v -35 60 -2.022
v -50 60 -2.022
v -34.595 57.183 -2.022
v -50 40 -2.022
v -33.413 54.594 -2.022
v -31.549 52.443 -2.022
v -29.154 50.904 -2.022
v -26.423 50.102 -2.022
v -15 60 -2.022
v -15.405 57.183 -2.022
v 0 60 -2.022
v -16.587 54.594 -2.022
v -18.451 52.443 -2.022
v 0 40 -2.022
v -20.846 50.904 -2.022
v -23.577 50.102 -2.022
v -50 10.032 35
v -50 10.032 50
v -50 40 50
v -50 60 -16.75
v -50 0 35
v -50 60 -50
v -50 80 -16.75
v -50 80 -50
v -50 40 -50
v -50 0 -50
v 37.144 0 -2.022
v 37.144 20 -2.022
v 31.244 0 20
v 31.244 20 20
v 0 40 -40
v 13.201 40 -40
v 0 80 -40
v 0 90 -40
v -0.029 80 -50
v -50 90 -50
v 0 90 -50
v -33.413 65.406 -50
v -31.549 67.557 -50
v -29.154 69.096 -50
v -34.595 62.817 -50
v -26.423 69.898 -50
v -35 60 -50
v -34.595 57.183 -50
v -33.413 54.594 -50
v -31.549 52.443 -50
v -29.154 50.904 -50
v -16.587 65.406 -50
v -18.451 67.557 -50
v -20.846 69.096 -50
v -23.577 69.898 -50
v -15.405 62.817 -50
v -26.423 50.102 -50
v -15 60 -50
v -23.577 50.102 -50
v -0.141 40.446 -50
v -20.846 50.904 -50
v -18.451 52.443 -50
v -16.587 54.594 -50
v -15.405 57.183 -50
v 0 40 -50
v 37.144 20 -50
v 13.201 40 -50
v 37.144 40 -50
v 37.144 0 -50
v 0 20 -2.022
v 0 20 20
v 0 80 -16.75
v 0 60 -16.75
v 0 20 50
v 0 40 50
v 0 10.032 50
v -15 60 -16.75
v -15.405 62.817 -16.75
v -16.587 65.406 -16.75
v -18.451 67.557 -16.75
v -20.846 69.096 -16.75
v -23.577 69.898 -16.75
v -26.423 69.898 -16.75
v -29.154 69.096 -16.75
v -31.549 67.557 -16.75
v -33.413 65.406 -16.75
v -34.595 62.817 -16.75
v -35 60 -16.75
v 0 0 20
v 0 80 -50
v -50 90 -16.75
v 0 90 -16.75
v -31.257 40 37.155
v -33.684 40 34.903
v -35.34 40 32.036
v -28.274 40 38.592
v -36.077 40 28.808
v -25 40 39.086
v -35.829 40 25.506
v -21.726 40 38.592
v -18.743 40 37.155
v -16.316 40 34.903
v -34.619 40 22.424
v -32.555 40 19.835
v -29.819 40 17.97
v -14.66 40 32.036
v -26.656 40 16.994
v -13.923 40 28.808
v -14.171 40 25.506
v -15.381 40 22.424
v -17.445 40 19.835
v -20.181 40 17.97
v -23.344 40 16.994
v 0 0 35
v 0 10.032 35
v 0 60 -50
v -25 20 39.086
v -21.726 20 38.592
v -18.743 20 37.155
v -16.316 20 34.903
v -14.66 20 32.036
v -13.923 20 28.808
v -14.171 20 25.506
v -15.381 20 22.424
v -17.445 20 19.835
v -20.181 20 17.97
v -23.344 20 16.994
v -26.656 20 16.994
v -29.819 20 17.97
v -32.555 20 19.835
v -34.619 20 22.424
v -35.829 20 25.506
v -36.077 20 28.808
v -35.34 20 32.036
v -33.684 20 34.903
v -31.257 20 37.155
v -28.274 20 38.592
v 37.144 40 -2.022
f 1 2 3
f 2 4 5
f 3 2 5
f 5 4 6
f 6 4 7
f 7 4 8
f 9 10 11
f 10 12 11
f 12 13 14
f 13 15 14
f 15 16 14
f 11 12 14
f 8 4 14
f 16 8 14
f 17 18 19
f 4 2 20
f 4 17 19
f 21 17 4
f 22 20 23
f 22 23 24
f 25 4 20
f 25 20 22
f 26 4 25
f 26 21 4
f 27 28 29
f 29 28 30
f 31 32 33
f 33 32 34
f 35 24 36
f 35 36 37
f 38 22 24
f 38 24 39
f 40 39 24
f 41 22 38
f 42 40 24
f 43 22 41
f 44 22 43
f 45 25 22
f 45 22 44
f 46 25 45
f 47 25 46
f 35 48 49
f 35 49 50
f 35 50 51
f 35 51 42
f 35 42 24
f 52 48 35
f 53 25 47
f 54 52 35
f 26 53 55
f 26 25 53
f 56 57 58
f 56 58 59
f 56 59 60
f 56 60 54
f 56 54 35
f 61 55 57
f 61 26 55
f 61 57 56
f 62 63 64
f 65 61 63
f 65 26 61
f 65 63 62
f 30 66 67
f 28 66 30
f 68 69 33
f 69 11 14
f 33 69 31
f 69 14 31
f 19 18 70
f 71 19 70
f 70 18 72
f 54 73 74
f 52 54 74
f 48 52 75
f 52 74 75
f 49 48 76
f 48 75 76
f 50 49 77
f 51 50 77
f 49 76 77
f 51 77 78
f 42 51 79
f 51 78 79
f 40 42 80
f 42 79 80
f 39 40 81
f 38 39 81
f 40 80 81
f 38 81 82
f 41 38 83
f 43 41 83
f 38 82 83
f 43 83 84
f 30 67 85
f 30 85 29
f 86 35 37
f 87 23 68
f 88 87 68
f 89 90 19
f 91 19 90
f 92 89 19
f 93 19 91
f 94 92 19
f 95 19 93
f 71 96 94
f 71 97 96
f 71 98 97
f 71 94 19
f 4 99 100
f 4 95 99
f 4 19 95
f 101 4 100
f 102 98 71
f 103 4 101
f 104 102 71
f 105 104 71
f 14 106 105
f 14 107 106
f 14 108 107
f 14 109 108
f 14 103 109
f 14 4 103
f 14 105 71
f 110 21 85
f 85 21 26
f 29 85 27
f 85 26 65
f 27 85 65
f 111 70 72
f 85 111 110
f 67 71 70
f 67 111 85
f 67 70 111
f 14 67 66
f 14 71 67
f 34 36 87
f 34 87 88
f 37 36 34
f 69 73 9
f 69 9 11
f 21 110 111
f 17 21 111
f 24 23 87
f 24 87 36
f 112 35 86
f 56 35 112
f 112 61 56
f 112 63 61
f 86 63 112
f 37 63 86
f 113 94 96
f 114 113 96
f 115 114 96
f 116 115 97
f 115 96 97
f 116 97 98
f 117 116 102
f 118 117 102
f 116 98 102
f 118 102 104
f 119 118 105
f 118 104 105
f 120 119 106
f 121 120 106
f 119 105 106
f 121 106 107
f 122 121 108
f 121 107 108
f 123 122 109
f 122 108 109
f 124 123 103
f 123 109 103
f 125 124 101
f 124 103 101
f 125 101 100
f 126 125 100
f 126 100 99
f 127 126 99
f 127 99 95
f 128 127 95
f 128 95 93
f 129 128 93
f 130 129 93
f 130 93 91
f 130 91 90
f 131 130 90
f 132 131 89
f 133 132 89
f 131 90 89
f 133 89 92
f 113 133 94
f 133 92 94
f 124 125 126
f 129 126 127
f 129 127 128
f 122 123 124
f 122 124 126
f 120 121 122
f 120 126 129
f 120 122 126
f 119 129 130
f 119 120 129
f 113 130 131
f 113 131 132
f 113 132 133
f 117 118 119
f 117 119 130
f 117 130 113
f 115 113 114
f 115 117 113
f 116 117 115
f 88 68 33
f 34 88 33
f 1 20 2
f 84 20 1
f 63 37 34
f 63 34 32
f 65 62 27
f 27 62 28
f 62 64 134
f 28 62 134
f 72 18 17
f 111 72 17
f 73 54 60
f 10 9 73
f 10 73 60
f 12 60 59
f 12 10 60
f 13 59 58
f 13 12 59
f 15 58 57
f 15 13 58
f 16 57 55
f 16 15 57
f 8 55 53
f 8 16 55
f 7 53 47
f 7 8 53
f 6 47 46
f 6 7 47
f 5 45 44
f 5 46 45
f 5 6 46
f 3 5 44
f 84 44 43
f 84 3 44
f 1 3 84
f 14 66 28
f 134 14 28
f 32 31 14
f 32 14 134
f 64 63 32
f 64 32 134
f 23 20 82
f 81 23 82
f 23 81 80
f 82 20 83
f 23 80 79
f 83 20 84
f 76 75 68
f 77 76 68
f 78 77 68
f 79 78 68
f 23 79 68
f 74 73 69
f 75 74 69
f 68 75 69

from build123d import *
from build123d.topology import SkipClean

# Parameters (mm, degrees)
CROQUIS1_W               = 100
CROQUIS1_H               = 100
SALIENTE_EXTRUIR1_DEPTH  = 20
CROQUIS2_W               = 50
CROQUIS2_H               = 52.022123513
SALIENTE_EXTRUIR2_DEPTH  = 20
CROQUIS6_W               = 50
CROQUIS6_H               = 30
CORTAR_EXTRUIR1_DEPTH    = 20
CROQUIS9_W               = 15
CROQUIS9_H               = 10.032008702
CORTAR_EXTRUIR8_DEPTH    = 50
CROQUIS10_R              = 11.107626401
CORTAR_EXTRUIR9_DEPTH    = 20
CORTAR_EXTRUIR11_DEPTH   = 20
CROQUIS14_W              = 87.144366741
CROQUIS14_H              = 47.977876487
SALIENTE_EXTRUIR4_DEPTH  = 20
CORTAR_EXTRUIR12_DEPTH   = 20
CROQUIS16_W              = 50
CROQUIS16_H              = 47.977876487
SALIENTE_EXTRUIR5_DEPTH  = 20
CORTAR_EXTRUIR13_DEPTH   = 94.841895413
CROQUIS22_W              = 50
CROQUIS22_H              = 33.250287406
SALIENTE_EXTRUIR6_DEPTH  = 20
CORTAR_EXTRUIR14_DEPTH   = 116.566102865
CROQUIS25_W              = 50
CROQUIS25_H              = 33.250287406
SALIENTE_EXTRUIR7_DEPTH  = 10
SALIENTE_EXTRUIR10_DEPTH = 10


with BuildPart() as part:
    # Croquis1 → Saliente-Extruir1 (new body)
    with BuildSketch(Plane(origin=(0, 0, 0), x_dir=(1, 0, 0), z_dir=(0, 1, 0))):
        Rectangle(CROQUIS1_W, CROQUIS1_H)
    extrude(amount=SALIENTE_EXTRUIR1_DEPTH)

    # Croquis2 → Saliente-Extruir2 (add)
    with BuildSketch(Plane(origin=(0, 20, 0), x_dir=(1, 0, 0), z_dir=(0, 1, 0))):
        with Locations((-25, -23.988938244)):
            Rectangle(CROQUIS2_W, CROQUIS2_H)
    extrude(amount=SALIENTE_EXTRUIR2_DEPTH)

    # Croquis6 → Cortar-Extruir1 (cut)
    with BuildSketch(Plane(origin=(0, 20, 0), x_dir=(1, 0, 0), z_dir=(0, 1, 0))):
        with Locations((25, -35)):
            Rectangle(CROQUIS6_W, CROQUIS6_H)
    extrude(amount=-CORTAR_EXTRUIR1_DEPTH, mode=Mode.SUBTRACT)

    # Croquis9 → Cortar-Extruir8 (cut)
    with BuildSketch(Plane(origin=(0, 0, 0), x_dir=(0, 0, -1), z_dir=(1, 0, 0))):
        with Locations((-42.5, 5.016004351)):
            Rectangle(CROQUIS9_W, CROQUIS9_H)
    extrude(amount=-CORTAR_EXTRUIR8_DEPTH, mode=Mode.SUBTRACT)

    # Croquis10 → Cortar-Extruir9 (cut)
    with BuildSketch(Plane(origin=(0, 40, 0), x_dir=(1, 0, 0), z_dir=(0, 1, 0))):
        with Locations(Location((-25, -27.977876487, 0), (0, 0, 270))):
            Circle(CROQUIS10_R)
    extrude(amount=-CORTAR_EXTRUIR9_DEPTH, mode=Mode.SUBTRACT)

    # Croquis12 → Cortar-Extruir11 (cut)
    with BuildSketch(Plane(origin=(0, 20, 0), x_dir=(1, 0, 0), z_dir=(0, 1, 0))):
        Polygon((50, 50), (31.24355653, -20), (50, -20), align=None)
    extrude(amount=-CORTAR_EXTRUIR11_DEPTH, mode=Mode.SUBTRACT)

    # Croquis14 → Saliente-Extruir4 (add)
    with BuildSketch(Plane(origin=(0, 20, 0), x_dir=(1, 0, 0), z_dir=(0, 1, 0))):
        with Locations((-6.42781663, 26.011061756)):
            Rectangle(CROQUIS14_W, CROQUIS14_H)
    extrude(amount=SALIENTE_EXTRUIR4_DEPTH)

    # Croquis15 → Cortar-Extruir12 (cut)
    with BuildSketch(Plane(origin=(0, 20, 0), x_dir=(1, 0, 0), z_dir=(0, 1, 0))):
        Polygon((37.144366741, 50), (37.144366741, 2.022123513), (50, 50), align=None)
    extrude(amount=-CORTAR_EXTRUIR12_DEPTH, mode=Mode.SUBTRACT)

    # Croquis16 → Saliente-Extruir5 (add)
    with BuildSketch(Plane(origin=(0, 40, 0), x_dir=(1, 0, 0), z_dir=(0, 1, 0))):
        with Locations((-25, 26.011061756)):
            Rectangle(CROQUIS16_W, CROQUIS16_H)
    extrude(amount=SALIENTE_EXTRUIR5_DEPTH)

    # Croquis19 → Cortar-Extruir13 (cut, through all)
    with BuildSketch(Plane.XY.offset(-2.022123513)):
        with BuildLine():
            Line((-35, 60), (-15, 60))
            ThreePointArc((-15, 60), (-25, 50), (-35, 60))
        make_face()
    extrude(amount=-CORTAR_EXTRUIR13_DEPTH, mode=Mode.SUBTRACT)

    # Croquis22 → Saliente-Extruir6 (add)
    with BuildSketch(Plane(origin=(0, 60, 0), x_dir=(1, 0, 0), z_dir=(0, 1, 0))):
        with Locations((-25, 33.374856297)):
            Rectangle(CROQUIS22_W, CROQUIS22_H)
    extrude(amount=SALIENTE_EXTRUIR6_DEPTH)

    # Croquis23 → Cortar-Extruir14 (cut, through all)
    with SkipClean():  # the faces are left unmerged after this step: merging them gives an invalid solid
        with BuildSketch(Plane.XY.offset(-16.749712594)):
            with BuildLine():
                Line((-35, 60), (-15, 60))
                ThreePointArc((-15, 60), (-25, 70), (-35, 60))
            make_face()
        extrude(amount=-CORTAR_EXTRUIR14_DEPTH, mode=Mode.SUBTRACT)

    # Croquis25 → Saliente-Extruir7 (add)
    with SkipClean():  # the faces are left unmerged after this step: merging them gives an invalid solid
        with BuildSketch(Plane(origin=(0, 80, 0), x_dir=(1, 0, 0), z_dir=(0, 1, 0))):
            with Locations((-25, 33.374856297)):
                Rectangle(CROQUIS25_W, CROQUIS25_H)
        extrude(amount=SALIENTE_EXTRUIR7_DEPTH)

    # Croquis29 → Saliente-Extruir10 (add)
    with SkipClean():  # the faces are left unmerged after this step: merging them gives an invalid solid
        with BuildSketch(Plane(origin=(0, 0, -50), x_dir=(-1, 0, 0), z_dir=(0, 0, -1))):
            Polygon((0, 90), (-13.201421023, 40), (0, 40), (0.141328754, 40.445503682), align=None)
        extrude(amount=-SALIENTE_EXTRUIR10_DEPTH)


solid = part.part
